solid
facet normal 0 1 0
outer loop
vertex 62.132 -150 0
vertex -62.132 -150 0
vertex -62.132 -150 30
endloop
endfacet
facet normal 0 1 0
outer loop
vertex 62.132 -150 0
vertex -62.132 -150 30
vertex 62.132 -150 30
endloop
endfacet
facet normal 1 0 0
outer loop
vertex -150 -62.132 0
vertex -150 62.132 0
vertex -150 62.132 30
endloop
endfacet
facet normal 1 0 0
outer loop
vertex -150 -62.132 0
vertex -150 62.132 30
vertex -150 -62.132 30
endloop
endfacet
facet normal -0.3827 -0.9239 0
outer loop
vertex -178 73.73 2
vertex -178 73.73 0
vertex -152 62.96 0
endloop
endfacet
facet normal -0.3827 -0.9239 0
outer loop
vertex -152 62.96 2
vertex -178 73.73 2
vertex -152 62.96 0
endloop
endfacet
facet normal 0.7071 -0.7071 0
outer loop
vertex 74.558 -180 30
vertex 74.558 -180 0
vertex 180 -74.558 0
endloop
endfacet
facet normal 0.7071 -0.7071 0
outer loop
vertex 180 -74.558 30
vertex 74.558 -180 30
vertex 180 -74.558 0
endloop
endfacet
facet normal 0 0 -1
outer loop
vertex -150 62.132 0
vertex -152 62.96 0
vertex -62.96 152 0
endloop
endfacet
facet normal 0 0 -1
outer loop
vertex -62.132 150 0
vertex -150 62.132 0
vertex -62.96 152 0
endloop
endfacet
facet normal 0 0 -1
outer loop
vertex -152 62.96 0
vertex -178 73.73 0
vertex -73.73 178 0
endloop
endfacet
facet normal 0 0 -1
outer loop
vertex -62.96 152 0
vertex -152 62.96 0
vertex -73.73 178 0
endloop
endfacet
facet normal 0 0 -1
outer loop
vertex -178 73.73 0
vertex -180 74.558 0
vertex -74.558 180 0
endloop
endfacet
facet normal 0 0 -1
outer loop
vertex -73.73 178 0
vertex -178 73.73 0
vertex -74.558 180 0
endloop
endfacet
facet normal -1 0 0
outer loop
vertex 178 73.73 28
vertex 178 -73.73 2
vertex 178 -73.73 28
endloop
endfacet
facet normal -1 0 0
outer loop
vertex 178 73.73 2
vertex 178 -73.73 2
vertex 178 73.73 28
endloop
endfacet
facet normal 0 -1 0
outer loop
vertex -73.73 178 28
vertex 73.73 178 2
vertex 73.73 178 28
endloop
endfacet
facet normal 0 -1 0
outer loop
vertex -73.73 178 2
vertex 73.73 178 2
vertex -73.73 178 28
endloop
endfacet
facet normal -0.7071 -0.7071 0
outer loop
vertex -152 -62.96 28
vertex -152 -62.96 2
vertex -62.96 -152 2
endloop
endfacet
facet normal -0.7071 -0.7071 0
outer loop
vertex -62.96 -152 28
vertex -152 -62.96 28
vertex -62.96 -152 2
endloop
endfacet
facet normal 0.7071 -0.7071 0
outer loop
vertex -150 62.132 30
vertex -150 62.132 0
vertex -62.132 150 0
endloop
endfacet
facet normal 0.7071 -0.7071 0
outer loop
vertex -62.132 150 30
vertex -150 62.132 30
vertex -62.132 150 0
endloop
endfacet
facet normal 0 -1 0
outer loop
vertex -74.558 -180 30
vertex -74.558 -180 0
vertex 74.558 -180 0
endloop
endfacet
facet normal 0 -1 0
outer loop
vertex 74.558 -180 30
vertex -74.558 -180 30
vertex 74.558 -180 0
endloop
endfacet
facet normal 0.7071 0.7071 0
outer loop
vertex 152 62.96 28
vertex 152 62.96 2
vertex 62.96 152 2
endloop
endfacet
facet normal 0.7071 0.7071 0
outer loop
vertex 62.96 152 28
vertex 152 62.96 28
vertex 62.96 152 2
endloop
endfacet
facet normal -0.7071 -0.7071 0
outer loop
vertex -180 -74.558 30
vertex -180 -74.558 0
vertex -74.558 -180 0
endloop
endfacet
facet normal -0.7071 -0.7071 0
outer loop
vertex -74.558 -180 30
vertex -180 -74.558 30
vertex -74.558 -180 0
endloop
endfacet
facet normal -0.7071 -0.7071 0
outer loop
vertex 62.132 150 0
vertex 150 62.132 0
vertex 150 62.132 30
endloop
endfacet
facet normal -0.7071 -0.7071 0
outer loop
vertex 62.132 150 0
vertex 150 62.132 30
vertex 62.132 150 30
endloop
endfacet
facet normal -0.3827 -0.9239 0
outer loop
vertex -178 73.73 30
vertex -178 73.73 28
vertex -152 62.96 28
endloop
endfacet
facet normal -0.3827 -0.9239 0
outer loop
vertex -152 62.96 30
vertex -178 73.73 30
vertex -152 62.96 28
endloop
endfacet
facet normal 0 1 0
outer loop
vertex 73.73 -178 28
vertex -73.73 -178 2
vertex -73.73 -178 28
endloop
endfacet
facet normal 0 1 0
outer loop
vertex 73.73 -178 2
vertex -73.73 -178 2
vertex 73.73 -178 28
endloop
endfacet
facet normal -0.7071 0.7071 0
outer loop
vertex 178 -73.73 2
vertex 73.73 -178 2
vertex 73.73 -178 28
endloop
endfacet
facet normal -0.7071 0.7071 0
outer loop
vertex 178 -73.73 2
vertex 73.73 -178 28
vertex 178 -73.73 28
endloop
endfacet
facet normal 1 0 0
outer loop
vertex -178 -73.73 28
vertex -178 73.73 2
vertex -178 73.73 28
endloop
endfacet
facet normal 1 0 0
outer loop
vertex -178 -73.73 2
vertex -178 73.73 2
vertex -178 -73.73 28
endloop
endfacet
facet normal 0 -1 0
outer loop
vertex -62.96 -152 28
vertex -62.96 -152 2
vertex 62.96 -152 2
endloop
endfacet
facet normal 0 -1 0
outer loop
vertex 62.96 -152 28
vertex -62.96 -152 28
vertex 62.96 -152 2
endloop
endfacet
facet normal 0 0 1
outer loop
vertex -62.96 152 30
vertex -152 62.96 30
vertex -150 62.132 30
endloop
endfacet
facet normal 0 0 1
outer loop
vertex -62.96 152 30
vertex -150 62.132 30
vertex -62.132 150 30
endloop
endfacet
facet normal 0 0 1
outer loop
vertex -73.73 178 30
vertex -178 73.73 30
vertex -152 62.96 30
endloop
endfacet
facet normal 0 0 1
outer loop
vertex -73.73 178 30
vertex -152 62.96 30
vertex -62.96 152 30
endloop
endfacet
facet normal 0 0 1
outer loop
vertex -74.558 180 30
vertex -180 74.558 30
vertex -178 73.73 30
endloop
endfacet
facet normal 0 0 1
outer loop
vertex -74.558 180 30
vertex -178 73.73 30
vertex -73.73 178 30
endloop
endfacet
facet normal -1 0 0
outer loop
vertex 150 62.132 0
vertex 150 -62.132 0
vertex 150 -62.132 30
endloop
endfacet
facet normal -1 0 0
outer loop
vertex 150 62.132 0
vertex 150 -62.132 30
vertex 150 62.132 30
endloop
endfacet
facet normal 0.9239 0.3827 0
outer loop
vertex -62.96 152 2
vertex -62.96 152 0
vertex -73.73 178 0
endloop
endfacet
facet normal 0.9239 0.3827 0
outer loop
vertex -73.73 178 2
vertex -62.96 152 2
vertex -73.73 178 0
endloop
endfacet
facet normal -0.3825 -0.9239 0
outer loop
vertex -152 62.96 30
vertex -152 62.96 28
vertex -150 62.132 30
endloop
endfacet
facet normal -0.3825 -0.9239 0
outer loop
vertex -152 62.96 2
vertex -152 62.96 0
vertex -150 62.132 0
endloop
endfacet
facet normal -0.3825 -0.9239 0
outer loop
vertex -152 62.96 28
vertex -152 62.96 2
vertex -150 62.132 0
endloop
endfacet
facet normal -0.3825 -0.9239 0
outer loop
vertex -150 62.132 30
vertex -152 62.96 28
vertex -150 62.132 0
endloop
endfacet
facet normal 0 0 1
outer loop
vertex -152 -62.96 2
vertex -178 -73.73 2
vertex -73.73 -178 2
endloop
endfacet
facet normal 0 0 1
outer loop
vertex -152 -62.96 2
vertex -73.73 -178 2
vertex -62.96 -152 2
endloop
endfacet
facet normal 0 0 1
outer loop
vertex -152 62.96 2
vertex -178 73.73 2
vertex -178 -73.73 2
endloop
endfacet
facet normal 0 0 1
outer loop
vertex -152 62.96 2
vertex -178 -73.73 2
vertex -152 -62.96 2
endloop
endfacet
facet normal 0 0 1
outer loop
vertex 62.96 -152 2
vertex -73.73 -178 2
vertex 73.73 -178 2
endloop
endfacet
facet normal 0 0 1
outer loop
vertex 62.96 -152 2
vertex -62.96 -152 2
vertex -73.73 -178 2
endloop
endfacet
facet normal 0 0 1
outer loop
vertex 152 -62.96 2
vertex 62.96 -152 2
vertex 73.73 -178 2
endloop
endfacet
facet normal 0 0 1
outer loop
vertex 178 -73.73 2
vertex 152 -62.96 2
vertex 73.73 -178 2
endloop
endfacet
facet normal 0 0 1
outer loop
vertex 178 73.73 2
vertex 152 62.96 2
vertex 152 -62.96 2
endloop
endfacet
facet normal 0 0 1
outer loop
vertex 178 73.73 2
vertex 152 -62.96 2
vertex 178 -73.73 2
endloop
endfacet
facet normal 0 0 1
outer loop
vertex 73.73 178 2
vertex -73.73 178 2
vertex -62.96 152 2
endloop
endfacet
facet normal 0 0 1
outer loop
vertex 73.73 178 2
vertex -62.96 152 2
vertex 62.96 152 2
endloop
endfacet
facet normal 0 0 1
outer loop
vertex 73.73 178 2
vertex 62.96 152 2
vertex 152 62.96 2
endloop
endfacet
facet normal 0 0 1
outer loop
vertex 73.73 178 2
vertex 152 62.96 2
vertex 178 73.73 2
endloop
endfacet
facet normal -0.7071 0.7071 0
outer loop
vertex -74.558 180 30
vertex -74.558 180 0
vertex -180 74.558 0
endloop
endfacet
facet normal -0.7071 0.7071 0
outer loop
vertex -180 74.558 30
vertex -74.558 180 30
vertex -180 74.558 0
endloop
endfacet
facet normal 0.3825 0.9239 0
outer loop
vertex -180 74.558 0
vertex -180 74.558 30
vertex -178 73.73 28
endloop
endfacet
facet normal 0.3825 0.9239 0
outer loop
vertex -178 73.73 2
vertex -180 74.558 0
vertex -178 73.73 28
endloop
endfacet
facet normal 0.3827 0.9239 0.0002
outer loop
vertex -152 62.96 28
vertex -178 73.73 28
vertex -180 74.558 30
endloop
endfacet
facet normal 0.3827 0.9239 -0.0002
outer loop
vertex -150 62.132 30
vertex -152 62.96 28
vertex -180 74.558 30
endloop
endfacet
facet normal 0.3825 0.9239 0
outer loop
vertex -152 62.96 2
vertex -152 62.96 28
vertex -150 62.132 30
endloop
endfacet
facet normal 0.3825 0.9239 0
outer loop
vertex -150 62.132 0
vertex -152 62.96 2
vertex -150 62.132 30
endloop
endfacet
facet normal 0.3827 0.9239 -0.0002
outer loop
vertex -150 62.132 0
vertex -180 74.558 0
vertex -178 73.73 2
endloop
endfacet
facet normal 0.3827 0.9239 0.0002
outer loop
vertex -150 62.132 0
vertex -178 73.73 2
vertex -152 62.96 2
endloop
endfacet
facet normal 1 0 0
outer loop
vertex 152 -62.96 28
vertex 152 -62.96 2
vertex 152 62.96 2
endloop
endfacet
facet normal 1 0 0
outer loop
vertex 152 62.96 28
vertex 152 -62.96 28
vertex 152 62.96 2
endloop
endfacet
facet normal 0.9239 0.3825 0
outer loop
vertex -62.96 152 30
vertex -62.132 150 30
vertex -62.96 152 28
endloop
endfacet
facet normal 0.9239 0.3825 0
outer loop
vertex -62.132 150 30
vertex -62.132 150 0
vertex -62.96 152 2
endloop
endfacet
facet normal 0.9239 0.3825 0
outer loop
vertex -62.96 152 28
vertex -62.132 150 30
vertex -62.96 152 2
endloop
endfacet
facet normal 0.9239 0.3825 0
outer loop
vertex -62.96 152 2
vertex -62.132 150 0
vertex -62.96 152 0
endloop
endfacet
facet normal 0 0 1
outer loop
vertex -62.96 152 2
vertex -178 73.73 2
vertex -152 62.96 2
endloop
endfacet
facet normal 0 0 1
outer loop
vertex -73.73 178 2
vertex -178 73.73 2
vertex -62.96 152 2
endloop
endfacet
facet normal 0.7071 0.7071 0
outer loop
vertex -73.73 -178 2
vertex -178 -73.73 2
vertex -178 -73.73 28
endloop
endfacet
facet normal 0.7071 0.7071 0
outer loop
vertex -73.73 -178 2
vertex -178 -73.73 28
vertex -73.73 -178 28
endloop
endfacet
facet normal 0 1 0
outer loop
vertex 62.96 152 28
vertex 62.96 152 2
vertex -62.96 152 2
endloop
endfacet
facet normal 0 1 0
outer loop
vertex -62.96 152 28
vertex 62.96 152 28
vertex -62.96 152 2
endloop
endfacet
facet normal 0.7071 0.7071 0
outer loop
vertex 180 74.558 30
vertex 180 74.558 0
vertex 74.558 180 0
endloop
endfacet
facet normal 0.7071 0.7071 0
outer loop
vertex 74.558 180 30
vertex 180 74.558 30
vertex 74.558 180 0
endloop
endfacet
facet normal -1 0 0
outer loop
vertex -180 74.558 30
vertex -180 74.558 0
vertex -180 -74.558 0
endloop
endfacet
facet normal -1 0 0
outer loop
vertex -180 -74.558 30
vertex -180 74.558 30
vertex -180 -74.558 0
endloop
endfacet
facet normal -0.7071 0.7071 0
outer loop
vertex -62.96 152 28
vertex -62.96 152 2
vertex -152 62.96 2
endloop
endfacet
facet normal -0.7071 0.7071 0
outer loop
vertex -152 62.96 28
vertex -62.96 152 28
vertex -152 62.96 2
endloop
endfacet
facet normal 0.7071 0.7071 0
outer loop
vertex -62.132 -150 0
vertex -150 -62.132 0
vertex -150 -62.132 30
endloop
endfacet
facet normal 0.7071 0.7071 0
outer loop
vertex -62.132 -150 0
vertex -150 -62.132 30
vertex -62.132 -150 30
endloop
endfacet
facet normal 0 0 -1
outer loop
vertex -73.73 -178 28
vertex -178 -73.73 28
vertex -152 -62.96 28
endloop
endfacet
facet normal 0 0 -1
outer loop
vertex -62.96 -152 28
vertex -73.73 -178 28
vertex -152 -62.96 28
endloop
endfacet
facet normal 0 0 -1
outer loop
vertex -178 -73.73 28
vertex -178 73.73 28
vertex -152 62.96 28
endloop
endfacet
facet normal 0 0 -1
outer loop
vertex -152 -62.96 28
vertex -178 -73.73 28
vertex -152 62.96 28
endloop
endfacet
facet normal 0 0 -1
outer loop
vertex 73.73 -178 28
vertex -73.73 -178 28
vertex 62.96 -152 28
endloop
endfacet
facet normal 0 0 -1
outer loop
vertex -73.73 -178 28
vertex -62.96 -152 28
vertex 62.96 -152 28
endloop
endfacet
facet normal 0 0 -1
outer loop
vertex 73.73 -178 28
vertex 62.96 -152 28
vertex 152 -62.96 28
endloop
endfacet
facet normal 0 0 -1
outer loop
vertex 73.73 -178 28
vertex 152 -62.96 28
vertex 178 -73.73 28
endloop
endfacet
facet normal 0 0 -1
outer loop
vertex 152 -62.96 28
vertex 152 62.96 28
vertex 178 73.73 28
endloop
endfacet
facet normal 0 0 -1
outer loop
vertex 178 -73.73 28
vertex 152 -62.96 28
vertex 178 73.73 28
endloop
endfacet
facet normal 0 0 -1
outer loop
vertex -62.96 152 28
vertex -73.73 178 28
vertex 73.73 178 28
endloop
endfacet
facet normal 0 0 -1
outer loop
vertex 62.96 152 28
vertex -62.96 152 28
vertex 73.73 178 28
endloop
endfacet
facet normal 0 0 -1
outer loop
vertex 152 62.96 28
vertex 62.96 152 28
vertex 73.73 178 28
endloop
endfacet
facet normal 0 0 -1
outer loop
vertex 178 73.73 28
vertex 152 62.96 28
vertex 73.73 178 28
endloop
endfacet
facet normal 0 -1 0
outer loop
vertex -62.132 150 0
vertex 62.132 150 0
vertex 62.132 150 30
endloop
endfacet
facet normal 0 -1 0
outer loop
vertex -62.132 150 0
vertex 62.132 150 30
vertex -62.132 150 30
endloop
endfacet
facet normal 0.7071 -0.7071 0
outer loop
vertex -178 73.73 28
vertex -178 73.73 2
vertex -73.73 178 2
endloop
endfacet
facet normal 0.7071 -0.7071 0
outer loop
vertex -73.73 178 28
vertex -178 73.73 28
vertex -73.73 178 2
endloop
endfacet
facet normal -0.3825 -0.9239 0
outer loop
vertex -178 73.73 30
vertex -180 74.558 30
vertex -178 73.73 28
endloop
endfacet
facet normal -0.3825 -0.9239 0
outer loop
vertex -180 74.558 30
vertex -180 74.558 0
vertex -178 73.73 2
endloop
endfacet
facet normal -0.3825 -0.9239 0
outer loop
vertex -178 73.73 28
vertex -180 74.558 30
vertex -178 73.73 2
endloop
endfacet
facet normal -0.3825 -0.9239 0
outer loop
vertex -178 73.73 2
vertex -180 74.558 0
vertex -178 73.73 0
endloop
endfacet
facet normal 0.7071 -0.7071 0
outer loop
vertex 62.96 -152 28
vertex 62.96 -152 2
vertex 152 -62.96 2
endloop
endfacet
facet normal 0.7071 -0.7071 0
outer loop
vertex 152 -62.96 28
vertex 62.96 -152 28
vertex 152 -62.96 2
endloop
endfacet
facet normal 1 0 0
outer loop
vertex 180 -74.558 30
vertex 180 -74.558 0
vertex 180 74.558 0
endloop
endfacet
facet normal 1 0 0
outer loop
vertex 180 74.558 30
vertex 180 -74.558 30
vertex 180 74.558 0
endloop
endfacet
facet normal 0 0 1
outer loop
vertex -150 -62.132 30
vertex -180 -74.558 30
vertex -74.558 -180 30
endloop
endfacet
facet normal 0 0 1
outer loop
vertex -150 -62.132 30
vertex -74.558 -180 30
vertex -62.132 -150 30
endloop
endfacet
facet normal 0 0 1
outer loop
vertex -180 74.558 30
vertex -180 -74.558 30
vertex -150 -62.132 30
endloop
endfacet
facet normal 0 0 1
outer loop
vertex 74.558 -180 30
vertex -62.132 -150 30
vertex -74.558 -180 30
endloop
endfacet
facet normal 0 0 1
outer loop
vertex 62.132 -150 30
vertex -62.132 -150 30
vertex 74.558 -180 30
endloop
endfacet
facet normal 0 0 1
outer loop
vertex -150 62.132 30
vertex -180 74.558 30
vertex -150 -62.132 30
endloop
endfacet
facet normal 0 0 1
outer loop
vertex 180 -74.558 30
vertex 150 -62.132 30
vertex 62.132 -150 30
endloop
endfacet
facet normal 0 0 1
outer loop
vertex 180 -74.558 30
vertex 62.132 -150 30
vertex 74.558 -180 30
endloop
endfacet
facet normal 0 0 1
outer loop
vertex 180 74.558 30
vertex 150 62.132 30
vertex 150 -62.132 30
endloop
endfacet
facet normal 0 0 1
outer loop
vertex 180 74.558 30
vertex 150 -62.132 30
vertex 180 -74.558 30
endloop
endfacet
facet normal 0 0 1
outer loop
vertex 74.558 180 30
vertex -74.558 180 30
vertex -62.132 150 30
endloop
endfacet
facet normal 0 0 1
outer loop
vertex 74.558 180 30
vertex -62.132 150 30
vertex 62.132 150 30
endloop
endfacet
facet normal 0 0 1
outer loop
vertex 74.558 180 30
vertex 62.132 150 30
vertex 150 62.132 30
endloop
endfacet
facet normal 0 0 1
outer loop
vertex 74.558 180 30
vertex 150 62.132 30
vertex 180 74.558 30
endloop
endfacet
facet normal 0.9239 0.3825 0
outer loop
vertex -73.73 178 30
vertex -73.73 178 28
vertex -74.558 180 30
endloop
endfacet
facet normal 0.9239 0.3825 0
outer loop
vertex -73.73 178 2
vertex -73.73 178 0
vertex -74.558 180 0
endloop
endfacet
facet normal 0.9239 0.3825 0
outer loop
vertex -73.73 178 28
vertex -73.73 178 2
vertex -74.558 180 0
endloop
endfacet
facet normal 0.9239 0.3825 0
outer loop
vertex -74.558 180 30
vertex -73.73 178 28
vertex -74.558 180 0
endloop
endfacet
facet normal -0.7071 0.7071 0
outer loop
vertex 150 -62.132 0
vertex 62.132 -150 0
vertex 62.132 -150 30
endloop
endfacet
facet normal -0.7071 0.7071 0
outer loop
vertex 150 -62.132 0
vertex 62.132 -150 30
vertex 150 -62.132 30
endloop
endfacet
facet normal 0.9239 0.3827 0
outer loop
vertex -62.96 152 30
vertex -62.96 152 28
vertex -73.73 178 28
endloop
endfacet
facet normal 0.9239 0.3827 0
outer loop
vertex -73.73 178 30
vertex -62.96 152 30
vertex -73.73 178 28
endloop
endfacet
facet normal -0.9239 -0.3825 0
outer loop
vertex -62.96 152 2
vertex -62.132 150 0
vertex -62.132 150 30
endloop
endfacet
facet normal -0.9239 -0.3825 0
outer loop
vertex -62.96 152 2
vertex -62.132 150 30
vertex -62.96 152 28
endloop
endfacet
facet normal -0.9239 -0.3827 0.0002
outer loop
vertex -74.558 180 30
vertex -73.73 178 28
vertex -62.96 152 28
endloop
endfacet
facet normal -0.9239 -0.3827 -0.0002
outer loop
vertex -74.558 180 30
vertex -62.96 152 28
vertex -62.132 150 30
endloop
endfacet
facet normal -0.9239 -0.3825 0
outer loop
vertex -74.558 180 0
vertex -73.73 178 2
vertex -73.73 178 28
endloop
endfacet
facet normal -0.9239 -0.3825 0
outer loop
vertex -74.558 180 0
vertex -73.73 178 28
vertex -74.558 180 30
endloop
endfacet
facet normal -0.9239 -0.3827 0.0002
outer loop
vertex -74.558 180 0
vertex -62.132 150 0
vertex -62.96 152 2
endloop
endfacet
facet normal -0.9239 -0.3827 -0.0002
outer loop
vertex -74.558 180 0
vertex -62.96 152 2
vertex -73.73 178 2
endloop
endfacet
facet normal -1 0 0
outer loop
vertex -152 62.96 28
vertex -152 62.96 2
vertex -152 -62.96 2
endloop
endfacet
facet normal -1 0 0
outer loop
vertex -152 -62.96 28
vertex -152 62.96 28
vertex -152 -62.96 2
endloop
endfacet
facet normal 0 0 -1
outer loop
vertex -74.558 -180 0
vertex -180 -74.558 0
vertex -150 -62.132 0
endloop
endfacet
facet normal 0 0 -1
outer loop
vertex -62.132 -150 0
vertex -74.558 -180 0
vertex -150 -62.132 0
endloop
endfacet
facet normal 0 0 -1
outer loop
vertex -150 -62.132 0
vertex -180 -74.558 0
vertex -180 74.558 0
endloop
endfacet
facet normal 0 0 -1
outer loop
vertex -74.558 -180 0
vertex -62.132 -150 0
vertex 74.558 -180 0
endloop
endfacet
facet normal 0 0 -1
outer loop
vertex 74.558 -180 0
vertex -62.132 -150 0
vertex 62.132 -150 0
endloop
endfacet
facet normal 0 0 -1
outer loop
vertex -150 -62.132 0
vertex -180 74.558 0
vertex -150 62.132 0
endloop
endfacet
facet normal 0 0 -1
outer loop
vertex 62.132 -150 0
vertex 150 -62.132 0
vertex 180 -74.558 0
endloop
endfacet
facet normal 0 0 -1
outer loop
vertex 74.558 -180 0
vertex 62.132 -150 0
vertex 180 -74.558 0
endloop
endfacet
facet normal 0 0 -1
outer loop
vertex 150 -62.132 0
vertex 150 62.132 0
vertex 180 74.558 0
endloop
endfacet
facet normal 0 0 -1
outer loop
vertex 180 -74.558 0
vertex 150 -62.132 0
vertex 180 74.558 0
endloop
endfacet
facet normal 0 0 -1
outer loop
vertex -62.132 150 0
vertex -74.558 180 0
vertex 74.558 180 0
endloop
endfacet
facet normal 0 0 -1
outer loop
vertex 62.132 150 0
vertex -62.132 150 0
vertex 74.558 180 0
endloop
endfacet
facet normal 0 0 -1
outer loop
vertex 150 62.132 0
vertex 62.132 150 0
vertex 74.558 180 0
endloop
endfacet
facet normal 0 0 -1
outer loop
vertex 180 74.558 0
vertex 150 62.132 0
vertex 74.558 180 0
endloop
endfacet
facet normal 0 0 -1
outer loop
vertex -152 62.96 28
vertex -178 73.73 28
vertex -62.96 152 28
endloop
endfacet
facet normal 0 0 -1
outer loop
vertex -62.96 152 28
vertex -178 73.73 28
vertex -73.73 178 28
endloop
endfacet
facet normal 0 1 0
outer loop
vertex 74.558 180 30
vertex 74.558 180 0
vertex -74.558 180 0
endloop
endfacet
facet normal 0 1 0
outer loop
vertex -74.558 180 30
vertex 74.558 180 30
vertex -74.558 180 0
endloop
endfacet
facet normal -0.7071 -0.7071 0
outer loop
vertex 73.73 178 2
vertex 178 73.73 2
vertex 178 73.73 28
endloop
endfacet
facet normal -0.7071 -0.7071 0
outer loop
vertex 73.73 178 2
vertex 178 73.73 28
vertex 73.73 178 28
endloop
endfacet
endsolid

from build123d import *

# Parameters (mm, degrees)
RESSALTO_EXTRUS_O1_DEPTH   = 30
RESSALTO_EXTRUS_O1_2_DEPTH = 30
RESSALTO_EXTRUS_O2_DEPTH   = 2
RESSALTO_EXTRUS_O3_START   = 30
RESSALTO_EXTRUS_O3_DEPTH   = 2
DIVIDIR1_DEPTH             = 30
DIVIDIR1_2_DEPTH           = 30
DIVIDIR1_3_DEPTH           = 2
DIVIDIR1_START             = 28
DIVIDIR1_4_DEPTH           = 2


# Read off the part's stored shape, not the designer's step: Dividir1
with BuildPart() as part:
    # Esboço2 → Ressalto-extrusão1 (new body)
    with BuildSketch(Plane.XY):
        Polygon((74.558441227, -180), (180, -74.558441227), (180, 74.558441227), (74.558441227, 180), (-74.558441227, 180), (-180, 74.558441227), (-180, -74.558441227), (-74.558441227, -180), align=None)
        Polygon((178, -73.730014102), (178, 73.730014102), (73.730014102, 178), (-73.730014102, 178), (-178, 73.730014102), (-178, -73.730014102), (-73.730014102, -178), (73.730014102, -178), align=None, mode=Mode.SUBTRACT)
    extrude(amount=RESSALTO_EXTRUS_O1_DEPTH)



with BuildPart() as body_2:
    # Esboço2 → Ressalto-extrus_o1 2 (new body)
    with BuildSketch(Plane.XY):
        Polygon((62.960461481, -152), (152, -62.960461481), (152, 62.960461481), (62.960461481, 152), (-62.960461481, 152), (-152, 62.960461481), (-152, -62.960461481), (-62.960461481, -152), align=None)
        Polygon((150, -62.132034356), (150, 62.132034356), (62.132034356, 150), (-62.132034356, 150), (-150, 62.132034356), (-150, -62.132034356), (-62.132034356, -150), (62.132034356, -150), align=None, mode=Mode.SUBTRACT)
    extrude(amount=RESSALTO_EXTRUS_O1_2_DEPTH)


with BuildPart() as part_1:
    add(part.part)

    add(body_2.part)  # Ressalto-extrusão2 merges body 2
    # Esboço2<4> → Ressalto-extrusão2 (add)
    with BuildSketch(Plane.XY):
        Polygon((73.730014102, -178), (178, -73.730014102), (178, 73.730014102), (73.730014102, 178), (-73.730014102, 178), (-178, 73.730014102), (-178, -73.730014102), (-73.730014102, -178), align=None)
        Polygon((152, -62.960461481), (152, 62.960461481), (62.960461481, 152), (-62.960461481, 152), (-152, 62.960461481), (-152, -62.960461481), (-62.960461481, -152), (62.960461481, -152), align=None, mode=Mode.SUBTRACT)
    extrude(amount=RESSALTO_EXTRUS_O2_DEPTH)

    # Esboço2<7> → Ressalto-extrusão3 (add)
    with BuildSketch(Plane.XY.offset(RESSALTO_EXTRUS_O3_START)):
        Polygon((73.730014102, -178), (178, -73.730014102), (178, 73.730014102), (73.730014102, 178), (-73.730014102, 178), (-178, 73.730014102), (-178, -73.730014102), (-73.730014102, -178), align=None)
        Polygon((152, -62.960461481), (152, 62.960461481), (62.960461481, 152), (-62.960461481, 152), (-152, 62.960461481), (-152, -62.960461481), (-62.960461481, -152), (62.960461481, -152), align=None, mode=Mode.SUBTRACT)
    extrude(amount=-RESSALTO_EXTRUS_O3_DEPTH)

    # Dividir1 outline → Dividir1 (cut)
    with BuildSketch(Plane.XY):
        Polygon((-150, 62.132034356), (-62.132034356, 150), (-74.558441227, 180), (-180, 74.558441227), align=None)
    extrude(amount=DIVIDIR1_DEPTH, mode=Mode.SUBTRACT)


with BuildPart() as body_2_2:
    # Dividir1 2 outline → Dividir1 2 (new body)
    with BuildSketch(Plane.XY):
        Polygon((-152, 62.960461481), (-150, 62.132034356), (-62.132034356, 150), (-62.960461481, 152), align=None)
        Polygon((-180, 74.558441227), (-178, 73.730014102), (-73.730014102, 178), (-74.558441227, 180), align=None)
    extrude(amount=DIVIDIR1_2_DEPTH)

    # Dividir1 3 outline → Dividir1 3 (add)
    with BuildSketch(Plane.XY):
        Polygon((-178, 73.730014102), (-152, 62.960461481), (-62.960461481, 152), (-73.730014102, 178), align=None)
    extrude(amount=DIVIDIR1_3_DEPTH)

    # Dividir1 4 outline → Dividir1 4 (add)
    with BuildSketch(Plane.XY.offset(DIVIDIR1_START)):
        Polygon((-178, 73.730014102), (-152, 62.960461481), (-62.960461481, 152), (-73.730014102, 178), align=None)
    extrude(amount=DIVIDIR1_4_DEPTH)


solid = Compound([part_1.part, body_2_2.part])
